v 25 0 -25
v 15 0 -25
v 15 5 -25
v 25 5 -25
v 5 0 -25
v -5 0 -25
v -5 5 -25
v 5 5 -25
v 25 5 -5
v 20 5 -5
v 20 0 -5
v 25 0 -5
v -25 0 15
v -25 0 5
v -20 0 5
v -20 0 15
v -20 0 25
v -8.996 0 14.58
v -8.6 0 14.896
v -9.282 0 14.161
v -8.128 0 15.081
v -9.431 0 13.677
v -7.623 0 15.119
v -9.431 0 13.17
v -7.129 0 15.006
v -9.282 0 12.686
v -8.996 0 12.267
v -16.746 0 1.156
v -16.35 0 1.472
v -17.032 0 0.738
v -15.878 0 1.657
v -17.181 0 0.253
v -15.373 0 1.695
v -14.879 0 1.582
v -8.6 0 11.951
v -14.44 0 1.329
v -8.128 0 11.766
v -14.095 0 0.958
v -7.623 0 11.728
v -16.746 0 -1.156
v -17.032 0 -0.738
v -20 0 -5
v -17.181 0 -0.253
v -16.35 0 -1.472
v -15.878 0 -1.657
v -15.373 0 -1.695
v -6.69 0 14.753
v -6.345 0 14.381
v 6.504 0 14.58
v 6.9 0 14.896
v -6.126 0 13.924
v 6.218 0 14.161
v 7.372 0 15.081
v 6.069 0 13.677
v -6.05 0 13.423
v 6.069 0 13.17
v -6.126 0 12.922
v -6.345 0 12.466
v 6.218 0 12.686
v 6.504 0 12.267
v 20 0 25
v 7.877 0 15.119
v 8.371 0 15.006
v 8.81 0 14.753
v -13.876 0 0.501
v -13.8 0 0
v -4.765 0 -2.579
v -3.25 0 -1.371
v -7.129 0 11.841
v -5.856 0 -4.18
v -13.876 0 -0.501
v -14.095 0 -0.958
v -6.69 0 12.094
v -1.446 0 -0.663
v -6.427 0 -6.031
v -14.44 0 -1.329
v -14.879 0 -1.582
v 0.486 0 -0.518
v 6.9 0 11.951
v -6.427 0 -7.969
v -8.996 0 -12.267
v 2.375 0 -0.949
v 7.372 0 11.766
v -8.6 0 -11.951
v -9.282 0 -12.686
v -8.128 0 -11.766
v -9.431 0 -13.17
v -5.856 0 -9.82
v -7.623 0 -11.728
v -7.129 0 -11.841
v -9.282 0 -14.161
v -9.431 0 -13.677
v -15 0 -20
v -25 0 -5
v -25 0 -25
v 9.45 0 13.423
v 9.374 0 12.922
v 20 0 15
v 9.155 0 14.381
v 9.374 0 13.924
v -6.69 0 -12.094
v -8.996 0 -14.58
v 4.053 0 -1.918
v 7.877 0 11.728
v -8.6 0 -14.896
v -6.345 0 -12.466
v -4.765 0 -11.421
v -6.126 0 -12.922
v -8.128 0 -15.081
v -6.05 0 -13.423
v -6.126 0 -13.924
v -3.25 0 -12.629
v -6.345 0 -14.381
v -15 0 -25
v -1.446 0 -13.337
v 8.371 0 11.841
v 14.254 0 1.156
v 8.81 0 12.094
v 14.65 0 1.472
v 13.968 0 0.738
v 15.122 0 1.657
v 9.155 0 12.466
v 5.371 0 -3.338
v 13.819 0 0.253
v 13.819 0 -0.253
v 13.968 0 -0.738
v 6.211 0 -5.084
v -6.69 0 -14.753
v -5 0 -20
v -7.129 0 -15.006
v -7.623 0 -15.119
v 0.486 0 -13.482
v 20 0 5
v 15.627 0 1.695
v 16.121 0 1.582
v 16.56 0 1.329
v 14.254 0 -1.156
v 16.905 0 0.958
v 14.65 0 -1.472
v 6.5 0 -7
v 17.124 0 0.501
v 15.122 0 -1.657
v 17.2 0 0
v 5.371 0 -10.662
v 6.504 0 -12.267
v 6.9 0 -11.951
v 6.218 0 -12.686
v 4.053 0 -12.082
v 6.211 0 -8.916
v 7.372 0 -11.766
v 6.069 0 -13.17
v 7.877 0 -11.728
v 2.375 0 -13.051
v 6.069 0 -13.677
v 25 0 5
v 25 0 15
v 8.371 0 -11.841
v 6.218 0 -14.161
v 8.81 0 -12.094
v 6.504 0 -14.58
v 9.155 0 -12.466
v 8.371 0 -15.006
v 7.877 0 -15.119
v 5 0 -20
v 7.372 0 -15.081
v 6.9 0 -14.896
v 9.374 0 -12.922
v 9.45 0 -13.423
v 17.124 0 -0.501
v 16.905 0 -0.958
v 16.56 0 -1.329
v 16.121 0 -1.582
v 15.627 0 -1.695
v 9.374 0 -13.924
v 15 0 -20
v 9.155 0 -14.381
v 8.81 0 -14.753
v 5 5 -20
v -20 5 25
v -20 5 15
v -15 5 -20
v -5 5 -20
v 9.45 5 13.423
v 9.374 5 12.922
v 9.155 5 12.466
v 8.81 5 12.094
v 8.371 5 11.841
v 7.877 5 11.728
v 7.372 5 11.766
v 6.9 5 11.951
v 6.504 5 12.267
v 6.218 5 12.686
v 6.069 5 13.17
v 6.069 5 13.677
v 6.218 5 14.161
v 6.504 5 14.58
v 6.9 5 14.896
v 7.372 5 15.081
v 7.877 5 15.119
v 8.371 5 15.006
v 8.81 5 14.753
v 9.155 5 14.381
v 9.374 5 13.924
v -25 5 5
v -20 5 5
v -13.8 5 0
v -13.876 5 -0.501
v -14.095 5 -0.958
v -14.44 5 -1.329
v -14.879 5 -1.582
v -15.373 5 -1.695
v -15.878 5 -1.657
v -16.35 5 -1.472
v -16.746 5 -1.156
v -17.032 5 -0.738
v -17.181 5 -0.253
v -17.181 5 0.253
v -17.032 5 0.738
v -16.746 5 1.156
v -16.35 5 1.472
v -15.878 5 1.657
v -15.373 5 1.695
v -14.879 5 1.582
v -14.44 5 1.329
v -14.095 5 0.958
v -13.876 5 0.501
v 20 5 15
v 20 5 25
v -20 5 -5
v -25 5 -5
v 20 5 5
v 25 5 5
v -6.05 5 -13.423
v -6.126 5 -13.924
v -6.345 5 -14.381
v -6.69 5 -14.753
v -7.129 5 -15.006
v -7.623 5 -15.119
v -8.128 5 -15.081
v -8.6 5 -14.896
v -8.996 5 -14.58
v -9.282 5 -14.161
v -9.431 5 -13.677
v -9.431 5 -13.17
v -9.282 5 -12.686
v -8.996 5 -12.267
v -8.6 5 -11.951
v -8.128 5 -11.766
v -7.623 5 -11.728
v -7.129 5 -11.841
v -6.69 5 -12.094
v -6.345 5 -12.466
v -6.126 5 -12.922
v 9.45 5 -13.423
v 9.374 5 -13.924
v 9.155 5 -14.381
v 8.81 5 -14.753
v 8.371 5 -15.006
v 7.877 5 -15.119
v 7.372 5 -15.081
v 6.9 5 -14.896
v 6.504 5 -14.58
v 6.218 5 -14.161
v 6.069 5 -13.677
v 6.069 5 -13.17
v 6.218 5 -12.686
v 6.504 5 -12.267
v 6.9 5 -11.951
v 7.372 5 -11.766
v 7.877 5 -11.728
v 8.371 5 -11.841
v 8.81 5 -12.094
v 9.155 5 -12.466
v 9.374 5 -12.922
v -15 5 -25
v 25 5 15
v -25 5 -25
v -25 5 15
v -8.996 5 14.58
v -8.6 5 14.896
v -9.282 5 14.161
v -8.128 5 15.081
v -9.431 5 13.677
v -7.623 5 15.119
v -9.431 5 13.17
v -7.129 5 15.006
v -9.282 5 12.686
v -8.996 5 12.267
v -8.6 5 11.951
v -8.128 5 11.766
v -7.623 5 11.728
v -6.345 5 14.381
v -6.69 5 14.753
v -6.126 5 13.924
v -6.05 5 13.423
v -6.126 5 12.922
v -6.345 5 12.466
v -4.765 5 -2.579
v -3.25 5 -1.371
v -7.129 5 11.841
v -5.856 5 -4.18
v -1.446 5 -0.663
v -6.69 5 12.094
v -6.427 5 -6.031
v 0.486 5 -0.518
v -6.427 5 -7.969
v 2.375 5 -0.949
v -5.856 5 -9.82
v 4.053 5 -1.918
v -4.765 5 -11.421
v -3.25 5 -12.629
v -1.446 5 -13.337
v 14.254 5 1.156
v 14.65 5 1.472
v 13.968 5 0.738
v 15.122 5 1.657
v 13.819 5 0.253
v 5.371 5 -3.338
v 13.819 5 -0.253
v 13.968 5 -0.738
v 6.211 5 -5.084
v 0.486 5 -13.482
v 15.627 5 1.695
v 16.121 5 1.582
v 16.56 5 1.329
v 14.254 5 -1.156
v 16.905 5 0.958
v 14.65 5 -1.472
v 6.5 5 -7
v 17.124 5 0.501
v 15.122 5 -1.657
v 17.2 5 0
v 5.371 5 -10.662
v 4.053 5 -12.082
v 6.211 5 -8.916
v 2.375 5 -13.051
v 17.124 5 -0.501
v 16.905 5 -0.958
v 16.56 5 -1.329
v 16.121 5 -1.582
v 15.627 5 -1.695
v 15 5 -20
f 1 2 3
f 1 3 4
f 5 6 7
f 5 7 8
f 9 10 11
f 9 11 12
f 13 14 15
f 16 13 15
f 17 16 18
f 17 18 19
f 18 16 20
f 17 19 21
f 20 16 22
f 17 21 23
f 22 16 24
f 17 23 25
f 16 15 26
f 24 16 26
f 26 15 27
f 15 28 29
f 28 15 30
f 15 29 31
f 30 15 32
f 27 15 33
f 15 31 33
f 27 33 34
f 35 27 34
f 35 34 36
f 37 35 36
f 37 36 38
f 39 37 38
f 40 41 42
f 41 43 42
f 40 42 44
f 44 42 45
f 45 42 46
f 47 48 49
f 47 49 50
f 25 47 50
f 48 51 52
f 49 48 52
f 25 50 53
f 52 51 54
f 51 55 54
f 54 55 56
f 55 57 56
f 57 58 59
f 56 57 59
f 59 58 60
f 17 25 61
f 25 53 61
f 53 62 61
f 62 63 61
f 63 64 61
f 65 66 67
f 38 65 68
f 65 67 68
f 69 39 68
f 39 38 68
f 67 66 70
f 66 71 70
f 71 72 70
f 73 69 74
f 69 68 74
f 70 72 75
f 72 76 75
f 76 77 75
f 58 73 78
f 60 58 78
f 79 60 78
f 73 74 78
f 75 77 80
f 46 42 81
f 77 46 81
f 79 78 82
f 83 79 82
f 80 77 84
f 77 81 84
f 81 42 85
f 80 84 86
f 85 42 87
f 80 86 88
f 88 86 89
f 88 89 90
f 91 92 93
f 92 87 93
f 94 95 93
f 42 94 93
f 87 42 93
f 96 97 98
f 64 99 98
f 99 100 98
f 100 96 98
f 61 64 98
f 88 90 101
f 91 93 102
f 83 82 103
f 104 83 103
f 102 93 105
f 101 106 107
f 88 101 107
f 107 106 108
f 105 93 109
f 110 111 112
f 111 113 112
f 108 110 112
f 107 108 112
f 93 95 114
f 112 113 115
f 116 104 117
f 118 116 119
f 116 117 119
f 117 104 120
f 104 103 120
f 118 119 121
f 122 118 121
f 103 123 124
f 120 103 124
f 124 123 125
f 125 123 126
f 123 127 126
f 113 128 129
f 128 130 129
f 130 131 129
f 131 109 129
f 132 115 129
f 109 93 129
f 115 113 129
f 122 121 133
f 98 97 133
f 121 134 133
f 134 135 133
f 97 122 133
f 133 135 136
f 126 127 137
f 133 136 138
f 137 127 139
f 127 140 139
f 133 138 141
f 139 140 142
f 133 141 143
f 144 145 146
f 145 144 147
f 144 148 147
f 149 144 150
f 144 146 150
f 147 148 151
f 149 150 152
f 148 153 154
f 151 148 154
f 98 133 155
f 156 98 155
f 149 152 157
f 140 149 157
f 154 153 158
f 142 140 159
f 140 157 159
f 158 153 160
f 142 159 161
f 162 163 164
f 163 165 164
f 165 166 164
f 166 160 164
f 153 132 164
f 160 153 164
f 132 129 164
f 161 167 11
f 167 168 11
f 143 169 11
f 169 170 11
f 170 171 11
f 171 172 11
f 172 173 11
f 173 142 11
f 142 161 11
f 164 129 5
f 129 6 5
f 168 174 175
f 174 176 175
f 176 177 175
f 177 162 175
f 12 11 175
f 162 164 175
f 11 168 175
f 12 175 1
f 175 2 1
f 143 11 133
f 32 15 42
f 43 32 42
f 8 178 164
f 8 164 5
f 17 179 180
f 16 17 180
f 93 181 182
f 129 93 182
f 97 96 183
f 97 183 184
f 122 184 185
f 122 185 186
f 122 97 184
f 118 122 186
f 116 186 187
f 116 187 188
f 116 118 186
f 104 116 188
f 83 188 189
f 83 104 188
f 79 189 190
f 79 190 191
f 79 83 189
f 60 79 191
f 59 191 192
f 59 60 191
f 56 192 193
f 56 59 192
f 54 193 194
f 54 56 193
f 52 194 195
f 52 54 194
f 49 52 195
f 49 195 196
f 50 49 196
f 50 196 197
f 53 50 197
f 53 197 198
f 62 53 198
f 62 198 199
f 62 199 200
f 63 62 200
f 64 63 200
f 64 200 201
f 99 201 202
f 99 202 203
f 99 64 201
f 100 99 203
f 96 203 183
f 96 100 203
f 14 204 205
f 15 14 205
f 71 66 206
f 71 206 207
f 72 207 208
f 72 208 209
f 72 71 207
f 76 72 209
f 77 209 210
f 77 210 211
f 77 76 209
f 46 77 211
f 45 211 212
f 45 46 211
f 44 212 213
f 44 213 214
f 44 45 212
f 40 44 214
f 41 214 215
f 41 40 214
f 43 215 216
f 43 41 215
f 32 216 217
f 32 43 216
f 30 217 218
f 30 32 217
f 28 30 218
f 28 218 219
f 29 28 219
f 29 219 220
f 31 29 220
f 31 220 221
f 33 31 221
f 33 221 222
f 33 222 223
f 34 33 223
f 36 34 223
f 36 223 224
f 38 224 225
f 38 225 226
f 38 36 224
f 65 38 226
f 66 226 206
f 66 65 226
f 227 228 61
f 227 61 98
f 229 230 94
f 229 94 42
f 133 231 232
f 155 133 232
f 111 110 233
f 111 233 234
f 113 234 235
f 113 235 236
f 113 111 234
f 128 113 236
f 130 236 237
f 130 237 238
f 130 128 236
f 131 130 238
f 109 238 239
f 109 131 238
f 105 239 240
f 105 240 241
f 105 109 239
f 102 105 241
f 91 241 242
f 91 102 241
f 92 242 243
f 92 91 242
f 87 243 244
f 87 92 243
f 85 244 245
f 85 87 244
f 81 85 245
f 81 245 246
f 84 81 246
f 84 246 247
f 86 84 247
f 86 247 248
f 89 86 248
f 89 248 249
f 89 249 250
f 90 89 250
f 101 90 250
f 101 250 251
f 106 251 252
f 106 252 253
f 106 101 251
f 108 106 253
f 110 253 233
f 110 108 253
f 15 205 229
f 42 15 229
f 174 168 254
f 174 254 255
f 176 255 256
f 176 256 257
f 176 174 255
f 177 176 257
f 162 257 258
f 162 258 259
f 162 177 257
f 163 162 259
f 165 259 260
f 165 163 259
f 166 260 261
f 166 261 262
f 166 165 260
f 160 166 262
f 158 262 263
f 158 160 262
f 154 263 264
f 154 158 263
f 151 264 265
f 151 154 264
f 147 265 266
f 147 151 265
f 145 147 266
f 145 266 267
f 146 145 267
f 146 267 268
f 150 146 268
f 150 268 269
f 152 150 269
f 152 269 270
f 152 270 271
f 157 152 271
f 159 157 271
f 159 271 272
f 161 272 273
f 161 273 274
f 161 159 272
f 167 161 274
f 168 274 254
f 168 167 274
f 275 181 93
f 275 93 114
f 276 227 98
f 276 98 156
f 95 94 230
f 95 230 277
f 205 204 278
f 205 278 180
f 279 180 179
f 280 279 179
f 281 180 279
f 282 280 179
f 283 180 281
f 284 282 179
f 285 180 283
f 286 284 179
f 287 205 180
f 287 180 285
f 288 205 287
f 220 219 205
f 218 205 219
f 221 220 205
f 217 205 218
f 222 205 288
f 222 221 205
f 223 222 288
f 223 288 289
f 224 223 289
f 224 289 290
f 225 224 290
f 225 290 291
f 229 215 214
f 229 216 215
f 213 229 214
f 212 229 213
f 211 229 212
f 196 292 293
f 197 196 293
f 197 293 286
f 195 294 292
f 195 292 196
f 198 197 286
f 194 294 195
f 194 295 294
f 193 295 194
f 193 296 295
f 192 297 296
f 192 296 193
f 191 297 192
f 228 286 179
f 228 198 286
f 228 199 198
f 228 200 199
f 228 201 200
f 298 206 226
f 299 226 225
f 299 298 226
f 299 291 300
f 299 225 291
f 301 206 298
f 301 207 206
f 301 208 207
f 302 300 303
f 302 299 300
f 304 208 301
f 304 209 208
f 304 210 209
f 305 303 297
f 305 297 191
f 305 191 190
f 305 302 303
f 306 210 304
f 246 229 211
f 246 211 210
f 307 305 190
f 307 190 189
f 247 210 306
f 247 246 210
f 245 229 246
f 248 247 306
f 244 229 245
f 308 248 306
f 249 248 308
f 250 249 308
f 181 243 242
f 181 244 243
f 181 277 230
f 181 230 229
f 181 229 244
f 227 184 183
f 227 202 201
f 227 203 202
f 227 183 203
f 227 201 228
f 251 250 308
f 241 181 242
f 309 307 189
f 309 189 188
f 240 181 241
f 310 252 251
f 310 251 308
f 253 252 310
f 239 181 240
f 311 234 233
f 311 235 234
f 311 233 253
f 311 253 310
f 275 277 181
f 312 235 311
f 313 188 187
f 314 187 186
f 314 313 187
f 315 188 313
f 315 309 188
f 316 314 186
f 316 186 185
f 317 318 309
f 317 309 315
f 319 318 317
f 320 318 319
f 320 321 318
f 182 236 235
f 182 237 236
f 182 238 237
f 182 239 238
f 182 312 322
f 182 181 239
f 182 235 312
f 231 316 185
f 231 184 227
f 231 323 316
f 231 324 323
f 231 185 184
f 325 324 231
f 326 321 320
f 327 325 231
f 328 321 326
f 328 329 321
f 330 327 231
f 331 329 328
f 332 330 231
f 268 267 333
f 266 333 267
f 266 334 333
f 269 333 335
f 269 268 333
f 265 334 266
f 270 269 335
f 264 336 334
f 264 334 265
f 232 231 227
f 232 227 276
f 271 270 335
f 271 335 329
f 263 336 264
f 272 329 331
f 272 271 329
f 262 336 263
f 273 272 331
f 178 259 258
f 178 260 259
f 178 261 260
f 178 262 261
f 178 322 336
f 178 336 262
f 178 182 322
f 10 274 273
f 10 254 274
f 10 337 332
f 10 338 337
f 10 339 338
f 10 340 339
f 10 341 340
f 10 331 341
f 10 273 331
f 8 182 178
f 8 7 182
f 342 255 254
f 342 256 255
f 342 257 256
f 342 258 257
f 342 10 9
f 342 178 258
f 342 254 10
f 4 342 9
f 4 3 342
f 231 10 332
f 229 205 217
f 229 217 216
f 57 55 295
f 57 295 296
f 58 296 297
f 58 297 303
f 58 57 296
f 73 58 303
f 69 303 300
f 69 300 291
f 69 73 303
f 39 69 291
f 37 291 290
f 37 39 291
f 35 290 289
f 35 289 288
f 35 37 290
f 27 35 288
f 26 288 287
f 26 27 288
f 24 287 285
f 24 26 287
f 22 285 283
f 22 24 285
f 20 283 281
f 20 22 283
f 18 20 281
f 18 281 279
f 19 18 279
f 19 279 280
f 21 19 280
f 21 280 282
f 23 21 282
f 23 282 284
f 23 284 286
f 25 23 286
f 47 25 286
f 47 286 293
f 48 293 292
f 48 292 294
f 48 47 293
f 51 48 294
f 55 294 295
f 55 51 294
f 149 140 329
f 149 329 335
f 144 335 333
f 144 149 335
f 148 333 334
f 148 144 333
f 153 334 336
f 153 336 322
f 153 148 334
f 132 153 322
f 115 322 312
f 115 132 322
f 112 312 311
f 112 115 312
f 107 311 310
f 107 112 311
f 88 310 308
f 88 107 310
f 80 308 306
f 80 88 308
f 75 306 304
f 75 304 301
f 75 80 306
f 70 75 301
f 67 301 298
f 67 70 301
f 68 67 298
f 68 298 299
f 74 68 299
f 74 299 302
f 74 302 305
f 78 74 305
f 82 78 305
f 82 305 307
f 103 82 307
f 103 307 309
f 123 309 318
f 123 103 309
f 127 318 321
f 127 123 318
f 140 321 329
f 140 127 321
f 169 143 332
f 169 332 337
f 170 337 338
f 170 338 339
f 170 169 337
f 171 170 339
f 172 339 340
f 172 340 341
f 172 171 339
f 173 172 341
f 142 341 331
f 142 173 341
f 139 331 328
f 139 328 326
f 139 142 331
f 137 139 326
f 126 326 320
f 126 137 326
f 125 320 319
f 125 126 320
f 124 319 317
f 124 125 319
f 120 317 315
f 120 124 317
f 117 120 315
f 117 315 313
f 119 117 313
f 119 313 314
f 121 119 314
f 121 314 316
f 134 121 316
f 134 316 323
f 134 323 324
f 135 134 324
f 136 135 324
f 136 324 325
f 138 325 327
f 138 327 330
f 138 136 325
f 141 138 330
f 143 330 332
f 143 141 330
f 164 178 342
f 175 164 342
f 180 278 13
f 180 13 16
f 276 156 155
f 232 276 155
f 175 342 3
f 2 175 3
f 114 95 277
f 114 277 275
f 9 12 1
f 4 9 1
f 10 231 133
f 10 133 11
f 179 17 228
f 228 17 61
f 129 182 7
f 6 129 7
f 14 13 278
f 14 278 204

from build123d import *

# Parameters (mm, degrees)
SKETCH_1_W          = 50
SKETCH_1_H          = 50
SKETCH_1_R          = 1.7
SKETCH_1_R_2        = 6.5
EXTRUDE_1_DEPTH     = 5
SKETCH_6_W          = 10
SKETCH_6_H          = 5
SKETCH_6_W_2        = 5
SKETCH_6_H_2        = 10
CUT_EXTRUDE_1_DEPTH = 6


with BuildPart() as part:
    # 草图1 → 凸台-拉伸1 (new body)
    with BuildSketch(Plane(origin=(0, 0, 0), x_dir=(1, 0, 0), z_dir=(0, 1, 0))):
        Rectangle(SKETCH_1_W, SKETCH_1_H)
        with Locations((-15.5, 0)):
            Circle(SKETCH_1_R, mode=Mode.SUBTRACT)
        with Locations((-7.75, 13.423393759)):
            Circle(SKETCH_1_R, mode=Mode.SUBTRACT)
        with Locations((7.75, 13.423393759)):
            Circle(SKETCH_1_R, mode=Mode.SUBTRACT)
        with Locations((15.5, 0)):
            Circle(SKETCH_1_R, mode=Mode.SUBTRACT)
        with Locations((7.75, -13.423393759)):
            Circle(SKETCH_1_R, mode=Mode.SUBTRACT)
        with Locations((-7.75, -13.423393759)):
            Circle(SKETCH_1_R, mode=Mode.SUBTRACT)
        with Locations((0, 7)):
            Circle(SKETCH_1_R_2, mode=Mode.SUBTRACT)
    extrude(amount=EXTRUDE_1_DEPTH)

    # 草图6 → 切除-拉伸1 (cut, through all)
    with BuildSketch(Plane(origin=(0, 5, 0), x_dir=(1, 0, 0), z_dir=(0, 1, 0))):
        with Locations((-10, 22.5)):
            Rectangle(SKETCH_6_W, SKETCH_6_H)
        with Locations((10, 22.5)):
            Rectangle(SKETCH_6_W, SKETCH_6_H)
        with Locations((-22.5, -20)):
            Rectangle(SKETCH_6_W_2, SKETCH_6_H_2)
        with Locations((-22.5, 0)):
            Rectangle(SKETCH_6_W_2, SKETCH_6_H_2)
        with Locations((22.5, -20)):
            Rectangle(SKETCH_6_W_2, SKETCH_6_H_2)
        with Locations((22.5, 0)):
            Rectangle(SKETCH_6_W_2, SKETCH_6_H_2)
    extrude(amount=-CUT_EXTRUDE_1_DEPTH, mode=Mode.SUBTRACT)


solid = part.part
